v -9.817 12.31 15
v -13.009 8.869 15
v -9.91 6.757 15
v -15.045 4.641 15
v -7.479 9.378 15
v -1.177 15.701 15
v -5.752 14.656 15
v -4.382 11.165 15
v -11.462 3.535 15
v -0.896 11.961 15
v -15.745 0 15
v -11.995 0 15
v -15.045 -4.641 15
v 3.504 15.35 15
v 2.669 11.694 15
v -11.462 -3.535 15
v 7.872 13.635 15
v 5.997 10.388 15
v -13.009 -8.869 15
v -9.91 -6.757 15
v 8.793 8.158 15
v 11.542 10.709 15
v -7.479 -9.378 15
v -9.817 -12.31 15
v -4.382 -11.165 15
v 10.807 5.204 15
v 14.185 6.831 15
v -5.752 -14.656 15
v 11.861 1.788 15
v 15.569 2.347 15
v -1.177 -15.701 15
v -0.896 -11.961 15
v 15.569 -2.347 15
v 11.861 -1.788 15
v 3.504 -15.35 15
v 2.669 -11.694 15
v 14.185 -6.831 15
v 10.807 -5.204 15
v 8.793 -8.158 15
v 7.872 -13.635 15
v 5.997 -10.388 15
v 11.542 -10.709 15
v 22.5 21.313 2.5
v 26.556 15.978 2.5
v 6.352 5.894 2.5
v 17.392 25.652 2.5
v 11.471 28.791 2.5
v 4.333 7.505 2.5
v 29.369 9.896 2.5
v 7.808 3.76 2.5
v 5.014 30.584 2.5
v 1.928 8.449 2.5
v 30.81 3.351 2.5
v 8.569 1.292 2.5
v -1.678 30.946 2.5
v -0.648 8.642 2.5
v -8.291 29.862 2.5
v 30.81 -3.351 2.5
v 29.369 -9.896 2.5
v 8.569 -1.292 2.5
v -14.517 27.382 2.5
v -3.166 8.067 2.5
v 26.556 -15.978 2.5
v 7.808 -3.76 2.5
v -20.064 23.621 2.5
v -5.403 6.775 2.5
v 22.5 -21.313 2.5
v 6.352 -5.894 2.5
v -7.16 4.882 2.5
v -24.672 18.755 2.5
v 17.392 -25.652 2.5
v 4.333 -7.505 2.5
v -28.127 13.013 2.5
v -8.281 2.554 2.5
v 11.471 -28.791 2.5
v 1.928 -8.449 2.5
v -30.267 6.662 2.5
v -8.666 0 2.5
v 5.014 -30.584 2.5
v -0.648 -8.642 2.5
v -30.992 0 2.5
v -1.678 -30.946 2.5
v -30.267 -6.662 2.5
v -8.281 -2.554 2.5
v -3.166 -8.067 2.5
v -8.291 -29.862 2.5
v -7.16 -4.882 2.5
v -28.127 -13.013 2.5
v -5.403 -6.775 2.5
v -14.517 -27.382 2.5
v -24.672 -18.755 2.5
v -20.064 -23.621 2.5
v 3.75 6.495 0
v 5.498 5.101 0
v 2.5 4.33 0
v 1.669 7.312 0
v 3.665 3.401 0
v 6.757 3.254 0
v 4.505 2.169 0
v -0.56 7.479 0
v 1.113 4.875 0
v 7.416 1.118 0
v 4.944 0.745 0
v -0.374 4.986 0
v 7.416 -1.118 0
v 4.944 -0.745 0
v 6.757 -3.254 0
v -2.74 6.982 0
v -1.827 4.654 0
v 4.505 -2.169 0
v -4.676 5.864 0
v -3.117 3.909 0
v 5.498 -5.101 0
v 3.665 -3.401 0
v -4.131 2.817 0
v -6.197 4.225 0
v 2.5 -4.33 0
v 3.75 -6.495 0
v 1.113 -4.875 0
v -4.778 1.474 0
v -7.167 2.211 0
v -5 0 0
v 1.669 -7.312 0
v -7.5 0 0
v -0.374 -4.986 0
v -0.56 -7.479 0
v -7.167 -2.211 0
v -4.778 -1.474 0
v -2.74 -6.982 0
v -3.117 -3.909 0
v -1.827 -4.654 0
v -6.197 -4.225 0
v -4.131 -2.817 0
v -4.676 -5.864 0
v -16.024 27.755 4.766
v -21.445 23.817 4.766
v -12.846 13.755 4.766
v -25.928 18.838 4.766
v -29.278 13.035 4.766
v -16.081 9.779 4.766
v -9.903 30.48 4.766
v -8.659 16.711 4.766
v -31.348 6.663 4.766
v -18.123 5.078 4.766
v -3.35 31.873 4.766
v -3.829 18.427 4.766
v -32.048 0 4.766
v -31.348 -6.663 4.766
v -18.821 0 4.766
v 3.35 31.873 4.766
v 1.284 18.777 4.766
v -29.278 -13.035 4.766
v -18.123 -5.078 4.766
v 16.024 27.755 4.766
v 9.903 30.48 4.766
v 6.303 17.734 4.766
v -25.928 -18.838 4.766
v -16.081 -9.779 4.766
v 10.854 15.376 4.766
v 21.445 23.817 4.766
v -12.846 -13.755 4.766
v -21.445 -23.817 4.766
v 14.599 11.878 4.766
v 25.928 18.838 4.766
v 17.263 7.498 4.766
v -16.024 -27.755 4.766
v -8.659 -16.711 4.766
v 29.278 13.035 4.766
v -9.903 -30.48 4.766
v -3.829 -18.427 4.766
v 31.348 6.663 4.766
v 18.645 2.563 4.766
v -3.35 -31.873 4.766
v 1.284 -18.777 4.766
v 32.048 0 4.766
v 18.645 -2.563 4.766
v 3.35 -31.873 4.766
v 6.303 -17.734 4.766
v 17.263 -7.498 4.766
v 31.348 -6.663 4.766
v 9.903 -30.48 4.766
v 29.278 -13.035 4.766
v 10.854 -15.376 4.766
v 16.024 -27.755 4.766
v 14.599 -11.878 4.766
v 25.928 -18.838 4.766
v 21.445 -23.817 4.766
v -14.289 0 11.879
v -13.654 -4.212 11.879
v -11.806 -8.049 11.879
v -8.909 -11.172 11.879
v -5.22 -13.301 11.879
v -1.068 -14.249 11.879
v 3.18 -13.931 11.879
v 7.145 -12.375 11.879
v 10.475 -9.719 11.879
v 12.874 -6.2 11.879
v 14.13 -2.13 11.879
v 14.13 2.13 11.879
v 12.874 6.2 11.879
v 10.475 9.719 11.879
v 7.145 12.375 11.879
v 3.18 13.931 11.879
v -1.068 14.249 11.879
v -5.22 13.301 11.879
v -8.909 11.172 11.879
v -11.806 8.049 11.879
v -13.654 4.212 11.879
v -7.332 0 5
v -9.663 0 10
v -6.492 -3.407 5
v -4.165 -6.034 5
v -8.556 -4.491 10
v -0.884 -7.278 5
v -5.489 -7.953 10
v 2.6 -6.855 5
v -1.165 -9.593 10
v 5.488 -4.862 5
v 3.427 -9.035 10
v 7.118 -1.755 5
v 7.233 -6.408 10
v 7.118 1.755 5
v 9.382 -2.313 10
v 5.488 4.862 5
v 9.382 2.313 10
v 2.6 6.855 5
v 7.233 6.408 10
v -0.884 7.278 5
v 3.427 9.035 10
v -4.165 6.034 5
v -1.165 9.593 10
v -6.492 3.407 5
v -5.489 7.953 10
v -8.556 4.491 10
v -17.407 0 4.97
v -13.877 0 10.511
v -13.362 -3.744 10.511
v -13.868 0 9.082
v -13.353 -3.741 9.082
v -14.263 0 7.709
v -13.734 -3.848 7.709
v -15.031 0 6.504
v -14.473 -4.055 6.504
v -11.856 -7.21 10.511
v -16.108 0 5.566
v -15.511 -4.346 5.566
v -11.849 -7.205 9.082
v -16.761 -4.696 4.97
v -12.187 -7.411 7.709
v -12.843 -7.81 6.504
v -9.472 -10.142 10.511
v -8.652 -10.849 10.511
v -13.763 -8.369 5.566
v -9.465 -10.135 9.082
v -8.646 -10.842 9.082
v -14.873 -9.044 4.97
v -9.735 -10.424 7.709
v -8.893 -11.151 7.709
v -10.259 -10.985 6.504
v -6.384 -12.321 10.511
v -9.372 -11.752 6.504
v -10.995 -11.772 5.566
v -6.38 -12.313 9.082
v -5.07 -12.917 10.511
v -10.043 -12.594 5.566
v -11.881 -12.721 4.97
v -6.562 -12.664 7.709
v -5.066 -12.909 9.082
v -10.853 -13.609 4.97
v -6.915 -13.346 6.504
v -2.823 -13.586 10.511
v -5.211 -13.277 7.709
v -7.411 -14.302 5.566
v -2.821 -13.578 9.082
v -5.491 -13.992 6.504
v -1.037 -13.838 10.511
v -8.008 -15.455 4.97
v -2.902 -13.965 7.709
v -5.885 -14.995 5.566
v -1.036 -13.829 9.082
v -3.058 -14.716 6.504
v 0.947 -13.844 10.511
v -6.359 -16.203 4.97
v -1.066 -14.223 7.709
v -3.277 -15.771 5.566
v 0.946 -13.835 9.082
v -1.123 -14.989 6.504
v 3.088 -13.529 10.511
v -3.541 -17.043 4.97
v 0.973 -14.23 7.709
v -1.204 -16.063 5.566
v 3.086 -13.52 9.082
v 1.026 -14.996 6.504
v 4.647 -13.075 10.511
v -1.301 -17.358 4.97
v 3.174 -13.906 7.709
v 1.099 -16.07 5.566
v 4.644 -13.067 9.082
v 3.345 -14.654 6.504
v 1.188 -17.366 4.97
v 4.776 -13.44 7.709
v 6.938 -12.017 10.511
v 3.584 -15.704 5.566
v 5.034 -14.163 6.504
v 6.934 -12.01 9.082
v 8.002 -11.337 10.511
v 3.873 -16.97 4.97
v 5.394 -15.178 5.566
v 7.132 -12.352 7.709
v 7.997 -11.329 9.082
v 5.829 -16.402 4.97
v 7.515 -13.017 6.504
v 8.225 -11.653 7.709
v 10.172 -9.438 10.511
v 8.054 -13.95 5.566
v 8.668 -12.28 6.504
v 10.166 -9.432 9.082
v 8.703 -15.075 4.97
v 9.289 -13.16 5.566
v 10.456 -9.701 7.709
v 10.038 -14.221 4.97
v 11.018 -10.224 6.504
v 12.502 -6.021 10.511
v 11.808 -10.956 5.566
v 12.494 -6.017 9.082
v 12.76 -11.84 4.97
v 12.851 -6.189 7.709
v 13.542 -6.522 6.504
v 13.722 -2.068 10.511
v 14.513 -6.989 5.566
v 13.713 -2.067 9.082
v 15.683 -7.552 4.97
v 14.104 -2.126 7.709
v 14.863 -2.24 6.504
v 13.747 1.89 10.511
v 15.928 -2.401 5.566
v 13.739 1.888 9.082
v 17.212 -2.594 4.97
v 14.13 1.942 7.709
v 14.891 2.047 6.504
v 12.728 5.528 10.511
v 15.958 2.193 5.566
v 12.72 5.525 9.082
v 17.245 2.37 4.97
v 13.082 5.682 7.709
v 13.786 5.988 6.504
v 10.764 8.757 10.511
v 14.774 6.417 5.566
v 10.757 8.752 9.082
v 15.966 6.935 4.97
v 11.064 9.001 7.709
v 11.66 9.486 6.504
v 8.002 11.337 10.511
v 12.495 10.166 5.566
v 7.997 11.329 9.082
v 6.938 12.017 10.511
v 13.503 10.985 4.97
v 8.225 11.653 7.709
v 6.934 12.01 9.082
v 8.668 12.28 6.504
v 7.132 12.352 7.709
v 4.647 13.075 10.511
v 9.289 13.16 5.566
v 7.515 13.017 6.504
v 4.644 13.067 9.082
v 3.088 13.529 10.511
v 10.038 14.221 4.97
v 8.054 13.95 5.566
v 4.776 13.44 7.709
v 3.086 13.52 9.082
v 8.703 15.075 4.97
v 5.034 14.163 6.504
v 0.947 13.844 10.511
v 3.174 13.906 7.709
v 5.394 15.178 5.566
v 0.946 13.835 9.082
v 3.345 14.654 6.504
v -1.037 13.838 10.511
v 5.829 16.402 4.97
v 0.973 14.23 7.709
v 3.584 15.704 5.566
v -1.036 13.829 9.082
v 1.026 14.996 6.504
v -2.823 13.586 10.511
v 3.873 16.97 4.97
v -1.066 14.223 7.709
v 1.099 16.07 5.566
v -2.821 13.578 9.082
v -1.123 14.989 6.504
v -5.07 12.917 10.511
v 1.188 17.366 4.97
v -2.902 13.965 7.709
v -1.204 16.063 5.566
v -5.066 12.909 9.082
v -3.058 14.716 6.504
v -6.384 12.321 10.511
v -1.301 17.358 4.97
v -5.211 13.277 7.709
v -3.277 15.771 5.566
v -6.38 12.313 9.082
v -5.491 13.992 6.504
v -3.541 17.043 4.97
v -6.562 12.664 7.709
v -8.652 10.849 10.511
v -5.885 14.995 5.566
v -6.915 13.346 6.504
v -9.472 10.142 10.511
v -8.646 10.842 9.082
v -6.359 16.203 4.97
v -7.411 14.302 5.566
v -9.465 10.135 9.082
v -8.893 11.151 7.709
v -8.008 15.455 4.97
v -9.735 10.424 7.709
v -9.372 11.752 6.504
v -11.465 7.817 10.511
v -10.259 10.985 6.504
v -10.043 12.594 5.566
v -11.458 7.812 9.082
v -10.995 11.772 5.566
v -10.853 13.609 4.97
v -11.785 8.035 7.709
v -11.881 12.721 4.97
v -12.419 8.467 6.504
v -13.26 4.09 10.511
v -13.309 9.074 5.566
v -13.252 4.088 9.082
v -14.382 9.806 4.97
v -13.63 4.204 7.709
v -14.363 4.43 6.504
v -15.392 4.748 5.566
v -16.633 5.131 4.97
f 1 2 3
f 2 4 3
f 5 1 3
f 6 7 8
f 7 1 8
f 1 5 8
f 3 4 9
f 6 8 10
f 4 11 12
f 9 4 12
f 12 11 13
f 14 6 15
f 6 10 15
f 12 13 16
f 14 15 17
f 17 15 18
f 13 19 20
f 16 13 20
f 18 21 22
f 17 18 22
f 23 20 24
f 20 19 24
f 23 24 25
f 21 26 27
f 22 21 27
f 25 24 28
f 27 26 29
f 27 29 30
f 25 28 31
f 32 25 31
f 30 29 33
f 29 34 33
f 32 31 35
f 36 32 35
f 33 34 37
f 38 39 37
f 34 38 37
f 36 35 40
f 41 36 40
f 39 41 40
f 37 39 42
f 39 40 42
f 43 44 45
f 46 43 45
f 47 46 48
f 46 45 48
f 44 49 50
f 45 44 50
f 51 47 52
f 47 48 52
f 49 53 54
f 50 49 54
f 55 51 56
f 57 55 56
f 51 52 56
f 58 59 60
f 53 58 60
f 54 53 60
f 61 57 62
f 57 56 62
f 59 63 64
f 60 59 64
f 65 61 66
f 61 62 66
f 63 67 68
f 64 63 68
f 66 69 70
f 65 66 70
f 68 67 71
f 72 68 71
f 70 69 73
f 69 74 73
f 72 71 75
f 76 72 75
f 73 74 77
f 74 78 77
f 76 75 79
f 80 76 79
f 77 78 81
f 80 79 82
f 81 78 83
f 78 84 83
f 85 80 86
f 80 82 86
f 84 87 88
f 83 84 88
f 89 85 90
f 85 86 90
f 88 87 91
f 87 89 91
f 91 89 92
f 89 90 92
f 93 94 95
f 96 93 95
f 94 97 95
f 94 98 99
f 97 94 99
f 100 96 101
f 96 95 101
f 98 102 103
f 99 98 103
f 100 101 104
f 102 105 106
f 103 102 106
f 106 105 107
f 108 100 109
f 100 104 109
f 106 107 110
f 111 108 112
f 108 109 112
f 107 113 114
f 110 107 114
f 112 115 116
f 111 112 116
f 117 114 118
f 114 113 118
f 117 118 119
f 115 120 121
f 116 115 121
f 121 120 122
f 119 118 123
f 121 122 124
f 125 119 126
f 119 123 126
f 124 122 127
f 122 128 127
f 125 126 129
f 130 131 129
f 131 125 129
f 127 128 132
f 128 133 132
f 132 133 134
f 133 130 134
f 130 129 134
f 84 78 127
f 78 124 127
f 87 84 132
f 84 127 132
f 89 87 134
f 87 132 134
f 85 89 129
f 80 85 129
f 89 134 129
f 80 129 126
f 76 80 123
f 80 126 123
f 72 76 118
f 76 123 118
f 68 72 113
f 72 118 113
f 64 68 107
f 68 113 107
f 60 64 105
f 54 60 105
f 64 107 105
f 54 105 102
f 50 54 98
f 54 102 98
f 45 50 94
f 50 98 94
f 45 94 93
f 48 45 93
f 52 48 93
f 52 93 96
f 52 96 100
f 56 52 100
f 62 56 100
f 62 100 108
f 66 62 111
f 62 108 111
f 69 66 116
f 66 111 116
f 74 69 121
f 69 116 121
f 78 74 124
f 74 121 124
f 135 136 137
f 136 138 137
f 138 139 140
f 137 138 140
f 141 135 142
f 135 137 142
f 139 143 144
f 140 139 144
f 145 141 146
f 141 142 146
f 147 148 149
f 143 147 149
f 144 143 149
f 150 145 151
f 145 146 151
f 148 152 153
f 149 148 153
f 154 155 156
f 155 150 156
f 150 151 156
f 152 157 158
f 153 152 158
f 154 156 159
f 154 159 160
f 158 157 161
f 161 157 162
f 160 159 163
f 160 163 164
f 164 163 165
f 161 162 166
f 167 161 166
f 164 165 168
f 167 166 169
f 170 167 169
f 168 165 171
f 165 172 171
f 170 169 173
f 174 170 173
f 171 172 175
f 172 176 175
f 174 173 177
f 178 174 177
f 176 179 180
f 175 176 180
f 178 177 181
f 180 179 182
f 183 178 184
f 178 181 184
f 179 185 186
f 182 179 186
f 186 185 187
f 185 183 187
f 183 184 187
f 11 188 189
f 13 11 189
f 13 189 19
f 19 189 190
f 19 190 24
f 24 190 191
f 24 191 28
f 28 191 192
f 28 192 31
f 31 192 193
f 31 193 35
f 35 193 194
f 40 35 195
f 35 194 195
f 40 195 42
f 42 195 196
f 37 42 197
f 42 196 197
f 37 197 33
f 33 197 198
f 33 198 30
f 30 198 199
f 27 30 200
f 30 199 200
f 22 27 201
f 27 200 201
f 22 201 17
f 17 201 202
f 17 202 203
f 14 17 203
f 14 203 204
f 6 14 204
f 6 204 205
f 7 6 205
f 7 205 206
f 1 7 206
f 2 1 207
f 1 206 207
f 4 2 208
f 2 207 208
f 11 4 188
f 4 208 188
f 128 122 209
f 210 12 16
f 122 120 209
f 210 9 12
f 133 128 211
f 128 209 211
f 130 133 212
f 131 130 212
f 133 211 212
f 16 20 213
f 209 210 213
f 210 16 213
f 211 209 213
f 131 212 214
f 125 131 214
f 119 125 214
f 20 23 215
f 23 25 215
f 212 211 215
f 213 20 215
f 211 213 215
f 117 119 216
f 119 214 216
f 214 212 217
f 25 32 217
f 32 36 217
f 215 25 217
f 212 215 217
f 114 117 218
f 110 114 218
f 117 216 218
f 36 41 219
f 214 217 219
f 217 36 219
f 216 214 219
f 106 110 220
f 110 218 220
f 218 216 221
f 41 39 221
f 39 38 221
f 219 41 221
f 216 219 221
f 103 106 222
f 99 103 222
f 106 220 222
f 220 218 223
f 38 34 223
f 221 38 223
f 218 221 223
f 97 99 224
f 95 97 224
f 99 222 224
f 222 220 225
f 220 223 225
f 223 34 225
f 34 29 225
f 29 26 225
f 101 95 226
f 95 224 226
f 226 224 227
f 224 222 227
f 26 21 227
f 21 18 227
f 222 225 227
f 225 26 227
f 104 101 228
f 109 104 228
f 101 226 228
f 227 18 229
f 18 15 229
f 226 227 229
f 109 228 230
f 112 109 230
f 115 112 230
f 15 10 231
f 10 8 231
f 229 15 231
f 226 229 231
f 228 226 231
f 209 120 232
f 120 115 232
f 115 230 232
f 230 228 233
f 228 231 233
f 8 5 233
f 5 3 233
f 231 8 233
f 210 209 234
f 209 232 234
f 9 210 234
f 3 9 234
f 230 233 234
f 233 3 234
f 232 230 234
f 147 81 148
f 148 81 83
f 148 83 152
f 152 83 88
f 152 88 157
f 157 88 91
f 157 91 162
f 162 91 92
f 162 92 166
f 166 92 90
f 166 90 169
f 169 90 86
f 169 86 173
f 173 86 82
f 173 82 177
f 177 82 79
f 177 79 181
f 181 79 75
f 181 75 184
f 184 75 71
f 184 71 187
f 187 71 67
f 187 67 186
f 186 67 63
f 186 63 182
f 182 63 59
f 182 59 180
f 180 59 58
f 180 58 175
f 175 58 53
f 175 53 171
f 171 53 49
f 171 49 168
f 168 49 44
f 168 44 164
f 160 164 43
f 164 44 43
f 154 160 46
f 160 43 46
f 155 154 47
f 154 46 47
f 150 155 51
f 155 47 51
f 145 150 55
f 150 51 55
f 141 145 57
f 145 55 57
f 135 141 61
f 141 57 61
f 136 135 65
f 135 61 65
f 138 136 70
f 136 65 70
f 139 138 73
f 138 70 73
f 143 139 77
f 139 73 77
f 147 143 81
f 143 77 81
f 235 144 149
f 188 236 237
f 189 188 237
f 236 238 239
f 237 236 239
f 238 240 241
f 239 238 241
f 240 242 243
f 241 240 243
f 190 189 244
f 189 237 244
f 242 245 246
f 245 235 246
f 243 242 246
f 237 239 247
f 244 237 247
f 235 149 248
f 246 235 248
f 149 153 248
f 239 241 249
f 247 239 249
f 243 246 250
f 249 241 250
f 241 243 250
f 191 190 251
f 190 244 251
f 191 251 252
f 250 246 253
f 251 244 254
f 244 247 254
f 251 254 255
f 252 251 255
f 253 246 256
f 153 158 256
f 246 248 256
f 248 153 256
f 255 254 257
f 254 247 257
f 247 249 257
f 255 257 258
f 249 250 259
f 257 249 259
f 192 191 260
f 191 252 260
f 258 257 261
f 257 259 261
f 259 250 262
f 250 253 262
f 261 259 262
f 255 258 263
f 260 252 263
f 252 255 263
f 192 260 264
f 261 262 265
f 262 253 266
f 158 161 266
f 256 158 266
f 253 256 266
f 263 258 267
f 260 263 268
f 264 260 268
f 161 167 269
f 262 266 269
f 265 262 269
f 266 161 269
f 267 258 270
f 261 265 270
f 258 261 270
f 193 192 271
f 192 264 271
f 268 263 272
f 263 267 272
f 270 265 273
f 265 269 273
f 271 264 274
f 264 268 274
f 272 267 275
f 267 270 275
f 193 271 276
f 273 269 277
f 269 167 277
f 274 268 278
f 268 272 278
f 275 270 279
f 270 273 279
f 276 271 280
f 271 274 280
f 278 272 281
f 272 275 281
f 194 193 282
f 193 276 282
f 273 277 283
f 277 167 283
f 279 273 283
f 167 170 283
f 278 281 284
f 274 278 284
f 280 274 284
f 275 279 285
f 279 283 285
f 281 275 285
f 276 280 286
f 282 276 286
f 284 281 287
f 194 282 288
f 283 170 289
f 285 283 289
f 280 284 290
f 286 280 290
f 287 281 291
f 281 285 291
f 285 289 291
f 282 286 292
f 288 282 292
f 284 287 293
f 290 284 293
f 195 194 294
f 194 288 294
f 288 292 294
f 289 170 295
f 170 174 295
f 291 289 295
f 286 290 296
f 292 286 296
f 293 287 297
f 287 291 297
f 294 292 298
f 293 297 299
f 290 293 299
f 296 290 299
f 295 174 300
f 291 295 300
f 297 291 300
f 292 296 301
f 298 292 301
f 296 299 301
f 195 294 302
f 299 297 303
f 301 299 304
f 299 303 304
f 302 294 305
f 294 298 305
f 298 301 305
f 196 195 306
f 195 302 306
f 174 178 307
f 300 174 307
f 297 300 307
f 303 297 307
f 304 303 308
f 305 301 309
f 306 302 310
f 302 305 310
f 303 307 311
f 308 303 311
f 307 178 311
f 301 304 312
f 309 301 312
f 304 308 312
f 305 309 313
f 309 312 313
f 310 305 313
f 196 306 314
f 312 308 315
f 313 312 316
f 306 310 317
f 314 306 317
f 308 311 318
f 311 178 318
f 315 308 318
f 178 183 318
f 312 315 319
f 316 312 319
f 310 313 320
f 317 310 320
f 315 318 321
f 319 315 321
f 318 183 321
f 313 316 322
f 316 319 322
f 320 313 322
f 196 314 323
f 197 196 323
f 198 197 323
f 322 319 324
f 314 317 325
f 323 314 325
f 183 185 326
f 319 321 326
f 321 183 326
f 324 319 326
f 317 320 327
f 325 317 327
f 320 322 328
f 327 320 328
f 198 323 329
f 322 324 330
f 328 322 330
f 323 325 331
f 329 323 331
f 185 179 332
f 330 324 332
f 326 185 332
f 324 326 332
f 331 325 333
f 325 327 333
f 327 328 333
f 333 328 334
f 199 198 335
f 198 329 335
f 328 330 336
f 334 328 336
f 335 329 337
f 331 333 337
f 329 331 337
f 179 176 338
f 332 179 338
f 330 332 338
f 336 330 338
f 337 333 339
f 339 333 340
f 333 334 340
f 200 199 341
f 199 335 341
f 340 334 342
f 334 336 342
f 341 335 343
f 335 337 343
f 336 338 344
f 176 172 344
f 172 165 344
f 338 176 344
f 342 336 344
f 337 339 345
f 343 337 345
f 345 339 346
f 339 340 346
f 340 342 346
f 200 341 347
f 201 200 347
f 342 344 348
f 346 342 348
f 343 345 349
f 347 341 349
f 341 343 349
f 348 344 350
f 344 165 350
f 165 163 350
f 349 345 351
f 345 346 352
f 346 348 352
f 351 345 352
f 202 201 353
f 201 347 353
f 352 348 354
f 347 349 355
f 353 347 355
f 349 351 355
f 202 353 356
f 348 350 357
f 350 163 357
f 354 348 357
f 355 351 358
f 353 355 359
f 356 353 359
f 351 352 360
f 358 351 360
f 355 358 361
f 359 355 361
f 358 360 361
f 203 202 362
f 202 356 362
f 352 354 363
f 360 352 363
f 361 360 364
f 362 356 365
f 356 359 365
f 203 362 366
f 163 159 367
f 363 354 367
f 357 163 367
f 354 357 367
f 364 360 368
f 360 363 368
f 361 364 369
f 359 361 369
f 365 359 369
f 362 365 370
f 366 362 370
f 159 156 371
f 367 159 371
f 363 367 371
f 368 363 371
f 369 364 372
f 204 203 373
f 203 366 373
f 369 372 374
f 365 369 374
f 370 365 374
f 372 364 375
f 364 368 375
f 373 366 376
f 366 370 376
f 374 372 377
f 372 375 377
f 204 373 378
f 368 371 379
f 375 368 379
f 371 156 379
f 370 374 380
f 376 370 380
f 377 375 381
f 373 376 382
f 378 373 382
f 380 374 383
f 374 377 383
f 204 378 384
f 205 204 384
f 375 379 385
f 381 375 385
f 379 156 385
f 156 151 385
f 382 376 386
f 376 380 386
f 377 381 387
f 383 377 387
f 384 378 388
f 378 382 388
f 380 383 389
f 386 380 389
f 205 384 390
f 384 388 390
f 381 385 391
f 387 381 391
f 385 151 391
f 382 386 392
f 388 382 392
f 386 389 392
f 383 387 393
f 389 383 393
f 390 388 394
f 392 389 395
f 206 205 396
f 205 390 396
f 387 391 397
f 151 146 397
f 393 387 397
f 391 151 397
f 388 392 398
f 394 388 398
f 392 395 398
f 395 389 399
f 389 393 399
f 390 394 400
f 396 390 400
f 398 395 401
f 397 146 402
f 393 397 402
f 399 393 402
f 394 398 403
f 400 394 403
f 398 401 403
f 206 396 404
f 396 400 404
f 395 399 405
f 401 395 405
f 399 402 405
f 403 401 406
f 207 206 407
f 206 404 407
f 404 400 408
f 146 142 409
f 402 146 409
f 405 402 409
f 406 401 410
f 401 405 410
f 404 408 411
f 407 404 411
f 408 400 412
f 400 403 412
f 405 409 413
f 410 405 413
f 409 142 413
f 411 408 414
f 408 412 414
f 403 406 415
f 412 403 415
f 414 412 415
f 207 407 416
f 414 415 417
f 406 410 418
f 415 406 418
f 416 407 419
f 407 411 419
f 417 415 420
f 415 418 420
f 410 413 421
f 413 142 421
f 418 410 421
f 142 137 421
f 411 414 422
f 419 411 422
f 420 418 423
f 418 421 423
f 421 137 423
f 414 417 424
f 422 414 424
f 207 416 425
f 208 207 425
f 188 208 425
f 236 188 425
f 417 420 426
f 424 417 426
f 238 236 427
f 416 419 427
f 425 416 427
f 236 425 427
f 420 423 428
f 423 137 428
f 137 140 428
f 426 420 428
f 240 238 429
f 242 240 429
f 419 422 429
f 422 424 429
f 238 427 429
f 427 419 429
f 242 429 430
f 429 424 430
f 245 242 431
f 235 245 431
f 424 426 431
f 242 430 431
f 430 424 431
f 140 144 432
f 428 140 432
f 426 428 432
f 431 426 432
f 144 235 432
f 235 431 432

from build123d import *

# Parameters (mm, degrees)
F3_R = 5


with BuildPart() as f2:
    # F0 (on Front) → F2 (revolve)
    with BuildSketch(Plane.XZ):
        Polygon((-7.5, 0), (-5, 0), (-11.994615, 15), (-15.744615, 15), (-10.972315, 4.765769), (-32.048318, 4.765769), (-30.991772, 2.5), (-8.665769, 2.5), align=None)
    revolve(axis=Axis((0, 0, 12.728581), (0, 0, 1)))

    # F3
    f3_edges = [f2.edges().sort_by_distance(p)[0] for p in [
        (10.972315, 0, 4.765769),
    ]]
    fillet(f3_edges, radius=F3_R)


solid = f2.part
